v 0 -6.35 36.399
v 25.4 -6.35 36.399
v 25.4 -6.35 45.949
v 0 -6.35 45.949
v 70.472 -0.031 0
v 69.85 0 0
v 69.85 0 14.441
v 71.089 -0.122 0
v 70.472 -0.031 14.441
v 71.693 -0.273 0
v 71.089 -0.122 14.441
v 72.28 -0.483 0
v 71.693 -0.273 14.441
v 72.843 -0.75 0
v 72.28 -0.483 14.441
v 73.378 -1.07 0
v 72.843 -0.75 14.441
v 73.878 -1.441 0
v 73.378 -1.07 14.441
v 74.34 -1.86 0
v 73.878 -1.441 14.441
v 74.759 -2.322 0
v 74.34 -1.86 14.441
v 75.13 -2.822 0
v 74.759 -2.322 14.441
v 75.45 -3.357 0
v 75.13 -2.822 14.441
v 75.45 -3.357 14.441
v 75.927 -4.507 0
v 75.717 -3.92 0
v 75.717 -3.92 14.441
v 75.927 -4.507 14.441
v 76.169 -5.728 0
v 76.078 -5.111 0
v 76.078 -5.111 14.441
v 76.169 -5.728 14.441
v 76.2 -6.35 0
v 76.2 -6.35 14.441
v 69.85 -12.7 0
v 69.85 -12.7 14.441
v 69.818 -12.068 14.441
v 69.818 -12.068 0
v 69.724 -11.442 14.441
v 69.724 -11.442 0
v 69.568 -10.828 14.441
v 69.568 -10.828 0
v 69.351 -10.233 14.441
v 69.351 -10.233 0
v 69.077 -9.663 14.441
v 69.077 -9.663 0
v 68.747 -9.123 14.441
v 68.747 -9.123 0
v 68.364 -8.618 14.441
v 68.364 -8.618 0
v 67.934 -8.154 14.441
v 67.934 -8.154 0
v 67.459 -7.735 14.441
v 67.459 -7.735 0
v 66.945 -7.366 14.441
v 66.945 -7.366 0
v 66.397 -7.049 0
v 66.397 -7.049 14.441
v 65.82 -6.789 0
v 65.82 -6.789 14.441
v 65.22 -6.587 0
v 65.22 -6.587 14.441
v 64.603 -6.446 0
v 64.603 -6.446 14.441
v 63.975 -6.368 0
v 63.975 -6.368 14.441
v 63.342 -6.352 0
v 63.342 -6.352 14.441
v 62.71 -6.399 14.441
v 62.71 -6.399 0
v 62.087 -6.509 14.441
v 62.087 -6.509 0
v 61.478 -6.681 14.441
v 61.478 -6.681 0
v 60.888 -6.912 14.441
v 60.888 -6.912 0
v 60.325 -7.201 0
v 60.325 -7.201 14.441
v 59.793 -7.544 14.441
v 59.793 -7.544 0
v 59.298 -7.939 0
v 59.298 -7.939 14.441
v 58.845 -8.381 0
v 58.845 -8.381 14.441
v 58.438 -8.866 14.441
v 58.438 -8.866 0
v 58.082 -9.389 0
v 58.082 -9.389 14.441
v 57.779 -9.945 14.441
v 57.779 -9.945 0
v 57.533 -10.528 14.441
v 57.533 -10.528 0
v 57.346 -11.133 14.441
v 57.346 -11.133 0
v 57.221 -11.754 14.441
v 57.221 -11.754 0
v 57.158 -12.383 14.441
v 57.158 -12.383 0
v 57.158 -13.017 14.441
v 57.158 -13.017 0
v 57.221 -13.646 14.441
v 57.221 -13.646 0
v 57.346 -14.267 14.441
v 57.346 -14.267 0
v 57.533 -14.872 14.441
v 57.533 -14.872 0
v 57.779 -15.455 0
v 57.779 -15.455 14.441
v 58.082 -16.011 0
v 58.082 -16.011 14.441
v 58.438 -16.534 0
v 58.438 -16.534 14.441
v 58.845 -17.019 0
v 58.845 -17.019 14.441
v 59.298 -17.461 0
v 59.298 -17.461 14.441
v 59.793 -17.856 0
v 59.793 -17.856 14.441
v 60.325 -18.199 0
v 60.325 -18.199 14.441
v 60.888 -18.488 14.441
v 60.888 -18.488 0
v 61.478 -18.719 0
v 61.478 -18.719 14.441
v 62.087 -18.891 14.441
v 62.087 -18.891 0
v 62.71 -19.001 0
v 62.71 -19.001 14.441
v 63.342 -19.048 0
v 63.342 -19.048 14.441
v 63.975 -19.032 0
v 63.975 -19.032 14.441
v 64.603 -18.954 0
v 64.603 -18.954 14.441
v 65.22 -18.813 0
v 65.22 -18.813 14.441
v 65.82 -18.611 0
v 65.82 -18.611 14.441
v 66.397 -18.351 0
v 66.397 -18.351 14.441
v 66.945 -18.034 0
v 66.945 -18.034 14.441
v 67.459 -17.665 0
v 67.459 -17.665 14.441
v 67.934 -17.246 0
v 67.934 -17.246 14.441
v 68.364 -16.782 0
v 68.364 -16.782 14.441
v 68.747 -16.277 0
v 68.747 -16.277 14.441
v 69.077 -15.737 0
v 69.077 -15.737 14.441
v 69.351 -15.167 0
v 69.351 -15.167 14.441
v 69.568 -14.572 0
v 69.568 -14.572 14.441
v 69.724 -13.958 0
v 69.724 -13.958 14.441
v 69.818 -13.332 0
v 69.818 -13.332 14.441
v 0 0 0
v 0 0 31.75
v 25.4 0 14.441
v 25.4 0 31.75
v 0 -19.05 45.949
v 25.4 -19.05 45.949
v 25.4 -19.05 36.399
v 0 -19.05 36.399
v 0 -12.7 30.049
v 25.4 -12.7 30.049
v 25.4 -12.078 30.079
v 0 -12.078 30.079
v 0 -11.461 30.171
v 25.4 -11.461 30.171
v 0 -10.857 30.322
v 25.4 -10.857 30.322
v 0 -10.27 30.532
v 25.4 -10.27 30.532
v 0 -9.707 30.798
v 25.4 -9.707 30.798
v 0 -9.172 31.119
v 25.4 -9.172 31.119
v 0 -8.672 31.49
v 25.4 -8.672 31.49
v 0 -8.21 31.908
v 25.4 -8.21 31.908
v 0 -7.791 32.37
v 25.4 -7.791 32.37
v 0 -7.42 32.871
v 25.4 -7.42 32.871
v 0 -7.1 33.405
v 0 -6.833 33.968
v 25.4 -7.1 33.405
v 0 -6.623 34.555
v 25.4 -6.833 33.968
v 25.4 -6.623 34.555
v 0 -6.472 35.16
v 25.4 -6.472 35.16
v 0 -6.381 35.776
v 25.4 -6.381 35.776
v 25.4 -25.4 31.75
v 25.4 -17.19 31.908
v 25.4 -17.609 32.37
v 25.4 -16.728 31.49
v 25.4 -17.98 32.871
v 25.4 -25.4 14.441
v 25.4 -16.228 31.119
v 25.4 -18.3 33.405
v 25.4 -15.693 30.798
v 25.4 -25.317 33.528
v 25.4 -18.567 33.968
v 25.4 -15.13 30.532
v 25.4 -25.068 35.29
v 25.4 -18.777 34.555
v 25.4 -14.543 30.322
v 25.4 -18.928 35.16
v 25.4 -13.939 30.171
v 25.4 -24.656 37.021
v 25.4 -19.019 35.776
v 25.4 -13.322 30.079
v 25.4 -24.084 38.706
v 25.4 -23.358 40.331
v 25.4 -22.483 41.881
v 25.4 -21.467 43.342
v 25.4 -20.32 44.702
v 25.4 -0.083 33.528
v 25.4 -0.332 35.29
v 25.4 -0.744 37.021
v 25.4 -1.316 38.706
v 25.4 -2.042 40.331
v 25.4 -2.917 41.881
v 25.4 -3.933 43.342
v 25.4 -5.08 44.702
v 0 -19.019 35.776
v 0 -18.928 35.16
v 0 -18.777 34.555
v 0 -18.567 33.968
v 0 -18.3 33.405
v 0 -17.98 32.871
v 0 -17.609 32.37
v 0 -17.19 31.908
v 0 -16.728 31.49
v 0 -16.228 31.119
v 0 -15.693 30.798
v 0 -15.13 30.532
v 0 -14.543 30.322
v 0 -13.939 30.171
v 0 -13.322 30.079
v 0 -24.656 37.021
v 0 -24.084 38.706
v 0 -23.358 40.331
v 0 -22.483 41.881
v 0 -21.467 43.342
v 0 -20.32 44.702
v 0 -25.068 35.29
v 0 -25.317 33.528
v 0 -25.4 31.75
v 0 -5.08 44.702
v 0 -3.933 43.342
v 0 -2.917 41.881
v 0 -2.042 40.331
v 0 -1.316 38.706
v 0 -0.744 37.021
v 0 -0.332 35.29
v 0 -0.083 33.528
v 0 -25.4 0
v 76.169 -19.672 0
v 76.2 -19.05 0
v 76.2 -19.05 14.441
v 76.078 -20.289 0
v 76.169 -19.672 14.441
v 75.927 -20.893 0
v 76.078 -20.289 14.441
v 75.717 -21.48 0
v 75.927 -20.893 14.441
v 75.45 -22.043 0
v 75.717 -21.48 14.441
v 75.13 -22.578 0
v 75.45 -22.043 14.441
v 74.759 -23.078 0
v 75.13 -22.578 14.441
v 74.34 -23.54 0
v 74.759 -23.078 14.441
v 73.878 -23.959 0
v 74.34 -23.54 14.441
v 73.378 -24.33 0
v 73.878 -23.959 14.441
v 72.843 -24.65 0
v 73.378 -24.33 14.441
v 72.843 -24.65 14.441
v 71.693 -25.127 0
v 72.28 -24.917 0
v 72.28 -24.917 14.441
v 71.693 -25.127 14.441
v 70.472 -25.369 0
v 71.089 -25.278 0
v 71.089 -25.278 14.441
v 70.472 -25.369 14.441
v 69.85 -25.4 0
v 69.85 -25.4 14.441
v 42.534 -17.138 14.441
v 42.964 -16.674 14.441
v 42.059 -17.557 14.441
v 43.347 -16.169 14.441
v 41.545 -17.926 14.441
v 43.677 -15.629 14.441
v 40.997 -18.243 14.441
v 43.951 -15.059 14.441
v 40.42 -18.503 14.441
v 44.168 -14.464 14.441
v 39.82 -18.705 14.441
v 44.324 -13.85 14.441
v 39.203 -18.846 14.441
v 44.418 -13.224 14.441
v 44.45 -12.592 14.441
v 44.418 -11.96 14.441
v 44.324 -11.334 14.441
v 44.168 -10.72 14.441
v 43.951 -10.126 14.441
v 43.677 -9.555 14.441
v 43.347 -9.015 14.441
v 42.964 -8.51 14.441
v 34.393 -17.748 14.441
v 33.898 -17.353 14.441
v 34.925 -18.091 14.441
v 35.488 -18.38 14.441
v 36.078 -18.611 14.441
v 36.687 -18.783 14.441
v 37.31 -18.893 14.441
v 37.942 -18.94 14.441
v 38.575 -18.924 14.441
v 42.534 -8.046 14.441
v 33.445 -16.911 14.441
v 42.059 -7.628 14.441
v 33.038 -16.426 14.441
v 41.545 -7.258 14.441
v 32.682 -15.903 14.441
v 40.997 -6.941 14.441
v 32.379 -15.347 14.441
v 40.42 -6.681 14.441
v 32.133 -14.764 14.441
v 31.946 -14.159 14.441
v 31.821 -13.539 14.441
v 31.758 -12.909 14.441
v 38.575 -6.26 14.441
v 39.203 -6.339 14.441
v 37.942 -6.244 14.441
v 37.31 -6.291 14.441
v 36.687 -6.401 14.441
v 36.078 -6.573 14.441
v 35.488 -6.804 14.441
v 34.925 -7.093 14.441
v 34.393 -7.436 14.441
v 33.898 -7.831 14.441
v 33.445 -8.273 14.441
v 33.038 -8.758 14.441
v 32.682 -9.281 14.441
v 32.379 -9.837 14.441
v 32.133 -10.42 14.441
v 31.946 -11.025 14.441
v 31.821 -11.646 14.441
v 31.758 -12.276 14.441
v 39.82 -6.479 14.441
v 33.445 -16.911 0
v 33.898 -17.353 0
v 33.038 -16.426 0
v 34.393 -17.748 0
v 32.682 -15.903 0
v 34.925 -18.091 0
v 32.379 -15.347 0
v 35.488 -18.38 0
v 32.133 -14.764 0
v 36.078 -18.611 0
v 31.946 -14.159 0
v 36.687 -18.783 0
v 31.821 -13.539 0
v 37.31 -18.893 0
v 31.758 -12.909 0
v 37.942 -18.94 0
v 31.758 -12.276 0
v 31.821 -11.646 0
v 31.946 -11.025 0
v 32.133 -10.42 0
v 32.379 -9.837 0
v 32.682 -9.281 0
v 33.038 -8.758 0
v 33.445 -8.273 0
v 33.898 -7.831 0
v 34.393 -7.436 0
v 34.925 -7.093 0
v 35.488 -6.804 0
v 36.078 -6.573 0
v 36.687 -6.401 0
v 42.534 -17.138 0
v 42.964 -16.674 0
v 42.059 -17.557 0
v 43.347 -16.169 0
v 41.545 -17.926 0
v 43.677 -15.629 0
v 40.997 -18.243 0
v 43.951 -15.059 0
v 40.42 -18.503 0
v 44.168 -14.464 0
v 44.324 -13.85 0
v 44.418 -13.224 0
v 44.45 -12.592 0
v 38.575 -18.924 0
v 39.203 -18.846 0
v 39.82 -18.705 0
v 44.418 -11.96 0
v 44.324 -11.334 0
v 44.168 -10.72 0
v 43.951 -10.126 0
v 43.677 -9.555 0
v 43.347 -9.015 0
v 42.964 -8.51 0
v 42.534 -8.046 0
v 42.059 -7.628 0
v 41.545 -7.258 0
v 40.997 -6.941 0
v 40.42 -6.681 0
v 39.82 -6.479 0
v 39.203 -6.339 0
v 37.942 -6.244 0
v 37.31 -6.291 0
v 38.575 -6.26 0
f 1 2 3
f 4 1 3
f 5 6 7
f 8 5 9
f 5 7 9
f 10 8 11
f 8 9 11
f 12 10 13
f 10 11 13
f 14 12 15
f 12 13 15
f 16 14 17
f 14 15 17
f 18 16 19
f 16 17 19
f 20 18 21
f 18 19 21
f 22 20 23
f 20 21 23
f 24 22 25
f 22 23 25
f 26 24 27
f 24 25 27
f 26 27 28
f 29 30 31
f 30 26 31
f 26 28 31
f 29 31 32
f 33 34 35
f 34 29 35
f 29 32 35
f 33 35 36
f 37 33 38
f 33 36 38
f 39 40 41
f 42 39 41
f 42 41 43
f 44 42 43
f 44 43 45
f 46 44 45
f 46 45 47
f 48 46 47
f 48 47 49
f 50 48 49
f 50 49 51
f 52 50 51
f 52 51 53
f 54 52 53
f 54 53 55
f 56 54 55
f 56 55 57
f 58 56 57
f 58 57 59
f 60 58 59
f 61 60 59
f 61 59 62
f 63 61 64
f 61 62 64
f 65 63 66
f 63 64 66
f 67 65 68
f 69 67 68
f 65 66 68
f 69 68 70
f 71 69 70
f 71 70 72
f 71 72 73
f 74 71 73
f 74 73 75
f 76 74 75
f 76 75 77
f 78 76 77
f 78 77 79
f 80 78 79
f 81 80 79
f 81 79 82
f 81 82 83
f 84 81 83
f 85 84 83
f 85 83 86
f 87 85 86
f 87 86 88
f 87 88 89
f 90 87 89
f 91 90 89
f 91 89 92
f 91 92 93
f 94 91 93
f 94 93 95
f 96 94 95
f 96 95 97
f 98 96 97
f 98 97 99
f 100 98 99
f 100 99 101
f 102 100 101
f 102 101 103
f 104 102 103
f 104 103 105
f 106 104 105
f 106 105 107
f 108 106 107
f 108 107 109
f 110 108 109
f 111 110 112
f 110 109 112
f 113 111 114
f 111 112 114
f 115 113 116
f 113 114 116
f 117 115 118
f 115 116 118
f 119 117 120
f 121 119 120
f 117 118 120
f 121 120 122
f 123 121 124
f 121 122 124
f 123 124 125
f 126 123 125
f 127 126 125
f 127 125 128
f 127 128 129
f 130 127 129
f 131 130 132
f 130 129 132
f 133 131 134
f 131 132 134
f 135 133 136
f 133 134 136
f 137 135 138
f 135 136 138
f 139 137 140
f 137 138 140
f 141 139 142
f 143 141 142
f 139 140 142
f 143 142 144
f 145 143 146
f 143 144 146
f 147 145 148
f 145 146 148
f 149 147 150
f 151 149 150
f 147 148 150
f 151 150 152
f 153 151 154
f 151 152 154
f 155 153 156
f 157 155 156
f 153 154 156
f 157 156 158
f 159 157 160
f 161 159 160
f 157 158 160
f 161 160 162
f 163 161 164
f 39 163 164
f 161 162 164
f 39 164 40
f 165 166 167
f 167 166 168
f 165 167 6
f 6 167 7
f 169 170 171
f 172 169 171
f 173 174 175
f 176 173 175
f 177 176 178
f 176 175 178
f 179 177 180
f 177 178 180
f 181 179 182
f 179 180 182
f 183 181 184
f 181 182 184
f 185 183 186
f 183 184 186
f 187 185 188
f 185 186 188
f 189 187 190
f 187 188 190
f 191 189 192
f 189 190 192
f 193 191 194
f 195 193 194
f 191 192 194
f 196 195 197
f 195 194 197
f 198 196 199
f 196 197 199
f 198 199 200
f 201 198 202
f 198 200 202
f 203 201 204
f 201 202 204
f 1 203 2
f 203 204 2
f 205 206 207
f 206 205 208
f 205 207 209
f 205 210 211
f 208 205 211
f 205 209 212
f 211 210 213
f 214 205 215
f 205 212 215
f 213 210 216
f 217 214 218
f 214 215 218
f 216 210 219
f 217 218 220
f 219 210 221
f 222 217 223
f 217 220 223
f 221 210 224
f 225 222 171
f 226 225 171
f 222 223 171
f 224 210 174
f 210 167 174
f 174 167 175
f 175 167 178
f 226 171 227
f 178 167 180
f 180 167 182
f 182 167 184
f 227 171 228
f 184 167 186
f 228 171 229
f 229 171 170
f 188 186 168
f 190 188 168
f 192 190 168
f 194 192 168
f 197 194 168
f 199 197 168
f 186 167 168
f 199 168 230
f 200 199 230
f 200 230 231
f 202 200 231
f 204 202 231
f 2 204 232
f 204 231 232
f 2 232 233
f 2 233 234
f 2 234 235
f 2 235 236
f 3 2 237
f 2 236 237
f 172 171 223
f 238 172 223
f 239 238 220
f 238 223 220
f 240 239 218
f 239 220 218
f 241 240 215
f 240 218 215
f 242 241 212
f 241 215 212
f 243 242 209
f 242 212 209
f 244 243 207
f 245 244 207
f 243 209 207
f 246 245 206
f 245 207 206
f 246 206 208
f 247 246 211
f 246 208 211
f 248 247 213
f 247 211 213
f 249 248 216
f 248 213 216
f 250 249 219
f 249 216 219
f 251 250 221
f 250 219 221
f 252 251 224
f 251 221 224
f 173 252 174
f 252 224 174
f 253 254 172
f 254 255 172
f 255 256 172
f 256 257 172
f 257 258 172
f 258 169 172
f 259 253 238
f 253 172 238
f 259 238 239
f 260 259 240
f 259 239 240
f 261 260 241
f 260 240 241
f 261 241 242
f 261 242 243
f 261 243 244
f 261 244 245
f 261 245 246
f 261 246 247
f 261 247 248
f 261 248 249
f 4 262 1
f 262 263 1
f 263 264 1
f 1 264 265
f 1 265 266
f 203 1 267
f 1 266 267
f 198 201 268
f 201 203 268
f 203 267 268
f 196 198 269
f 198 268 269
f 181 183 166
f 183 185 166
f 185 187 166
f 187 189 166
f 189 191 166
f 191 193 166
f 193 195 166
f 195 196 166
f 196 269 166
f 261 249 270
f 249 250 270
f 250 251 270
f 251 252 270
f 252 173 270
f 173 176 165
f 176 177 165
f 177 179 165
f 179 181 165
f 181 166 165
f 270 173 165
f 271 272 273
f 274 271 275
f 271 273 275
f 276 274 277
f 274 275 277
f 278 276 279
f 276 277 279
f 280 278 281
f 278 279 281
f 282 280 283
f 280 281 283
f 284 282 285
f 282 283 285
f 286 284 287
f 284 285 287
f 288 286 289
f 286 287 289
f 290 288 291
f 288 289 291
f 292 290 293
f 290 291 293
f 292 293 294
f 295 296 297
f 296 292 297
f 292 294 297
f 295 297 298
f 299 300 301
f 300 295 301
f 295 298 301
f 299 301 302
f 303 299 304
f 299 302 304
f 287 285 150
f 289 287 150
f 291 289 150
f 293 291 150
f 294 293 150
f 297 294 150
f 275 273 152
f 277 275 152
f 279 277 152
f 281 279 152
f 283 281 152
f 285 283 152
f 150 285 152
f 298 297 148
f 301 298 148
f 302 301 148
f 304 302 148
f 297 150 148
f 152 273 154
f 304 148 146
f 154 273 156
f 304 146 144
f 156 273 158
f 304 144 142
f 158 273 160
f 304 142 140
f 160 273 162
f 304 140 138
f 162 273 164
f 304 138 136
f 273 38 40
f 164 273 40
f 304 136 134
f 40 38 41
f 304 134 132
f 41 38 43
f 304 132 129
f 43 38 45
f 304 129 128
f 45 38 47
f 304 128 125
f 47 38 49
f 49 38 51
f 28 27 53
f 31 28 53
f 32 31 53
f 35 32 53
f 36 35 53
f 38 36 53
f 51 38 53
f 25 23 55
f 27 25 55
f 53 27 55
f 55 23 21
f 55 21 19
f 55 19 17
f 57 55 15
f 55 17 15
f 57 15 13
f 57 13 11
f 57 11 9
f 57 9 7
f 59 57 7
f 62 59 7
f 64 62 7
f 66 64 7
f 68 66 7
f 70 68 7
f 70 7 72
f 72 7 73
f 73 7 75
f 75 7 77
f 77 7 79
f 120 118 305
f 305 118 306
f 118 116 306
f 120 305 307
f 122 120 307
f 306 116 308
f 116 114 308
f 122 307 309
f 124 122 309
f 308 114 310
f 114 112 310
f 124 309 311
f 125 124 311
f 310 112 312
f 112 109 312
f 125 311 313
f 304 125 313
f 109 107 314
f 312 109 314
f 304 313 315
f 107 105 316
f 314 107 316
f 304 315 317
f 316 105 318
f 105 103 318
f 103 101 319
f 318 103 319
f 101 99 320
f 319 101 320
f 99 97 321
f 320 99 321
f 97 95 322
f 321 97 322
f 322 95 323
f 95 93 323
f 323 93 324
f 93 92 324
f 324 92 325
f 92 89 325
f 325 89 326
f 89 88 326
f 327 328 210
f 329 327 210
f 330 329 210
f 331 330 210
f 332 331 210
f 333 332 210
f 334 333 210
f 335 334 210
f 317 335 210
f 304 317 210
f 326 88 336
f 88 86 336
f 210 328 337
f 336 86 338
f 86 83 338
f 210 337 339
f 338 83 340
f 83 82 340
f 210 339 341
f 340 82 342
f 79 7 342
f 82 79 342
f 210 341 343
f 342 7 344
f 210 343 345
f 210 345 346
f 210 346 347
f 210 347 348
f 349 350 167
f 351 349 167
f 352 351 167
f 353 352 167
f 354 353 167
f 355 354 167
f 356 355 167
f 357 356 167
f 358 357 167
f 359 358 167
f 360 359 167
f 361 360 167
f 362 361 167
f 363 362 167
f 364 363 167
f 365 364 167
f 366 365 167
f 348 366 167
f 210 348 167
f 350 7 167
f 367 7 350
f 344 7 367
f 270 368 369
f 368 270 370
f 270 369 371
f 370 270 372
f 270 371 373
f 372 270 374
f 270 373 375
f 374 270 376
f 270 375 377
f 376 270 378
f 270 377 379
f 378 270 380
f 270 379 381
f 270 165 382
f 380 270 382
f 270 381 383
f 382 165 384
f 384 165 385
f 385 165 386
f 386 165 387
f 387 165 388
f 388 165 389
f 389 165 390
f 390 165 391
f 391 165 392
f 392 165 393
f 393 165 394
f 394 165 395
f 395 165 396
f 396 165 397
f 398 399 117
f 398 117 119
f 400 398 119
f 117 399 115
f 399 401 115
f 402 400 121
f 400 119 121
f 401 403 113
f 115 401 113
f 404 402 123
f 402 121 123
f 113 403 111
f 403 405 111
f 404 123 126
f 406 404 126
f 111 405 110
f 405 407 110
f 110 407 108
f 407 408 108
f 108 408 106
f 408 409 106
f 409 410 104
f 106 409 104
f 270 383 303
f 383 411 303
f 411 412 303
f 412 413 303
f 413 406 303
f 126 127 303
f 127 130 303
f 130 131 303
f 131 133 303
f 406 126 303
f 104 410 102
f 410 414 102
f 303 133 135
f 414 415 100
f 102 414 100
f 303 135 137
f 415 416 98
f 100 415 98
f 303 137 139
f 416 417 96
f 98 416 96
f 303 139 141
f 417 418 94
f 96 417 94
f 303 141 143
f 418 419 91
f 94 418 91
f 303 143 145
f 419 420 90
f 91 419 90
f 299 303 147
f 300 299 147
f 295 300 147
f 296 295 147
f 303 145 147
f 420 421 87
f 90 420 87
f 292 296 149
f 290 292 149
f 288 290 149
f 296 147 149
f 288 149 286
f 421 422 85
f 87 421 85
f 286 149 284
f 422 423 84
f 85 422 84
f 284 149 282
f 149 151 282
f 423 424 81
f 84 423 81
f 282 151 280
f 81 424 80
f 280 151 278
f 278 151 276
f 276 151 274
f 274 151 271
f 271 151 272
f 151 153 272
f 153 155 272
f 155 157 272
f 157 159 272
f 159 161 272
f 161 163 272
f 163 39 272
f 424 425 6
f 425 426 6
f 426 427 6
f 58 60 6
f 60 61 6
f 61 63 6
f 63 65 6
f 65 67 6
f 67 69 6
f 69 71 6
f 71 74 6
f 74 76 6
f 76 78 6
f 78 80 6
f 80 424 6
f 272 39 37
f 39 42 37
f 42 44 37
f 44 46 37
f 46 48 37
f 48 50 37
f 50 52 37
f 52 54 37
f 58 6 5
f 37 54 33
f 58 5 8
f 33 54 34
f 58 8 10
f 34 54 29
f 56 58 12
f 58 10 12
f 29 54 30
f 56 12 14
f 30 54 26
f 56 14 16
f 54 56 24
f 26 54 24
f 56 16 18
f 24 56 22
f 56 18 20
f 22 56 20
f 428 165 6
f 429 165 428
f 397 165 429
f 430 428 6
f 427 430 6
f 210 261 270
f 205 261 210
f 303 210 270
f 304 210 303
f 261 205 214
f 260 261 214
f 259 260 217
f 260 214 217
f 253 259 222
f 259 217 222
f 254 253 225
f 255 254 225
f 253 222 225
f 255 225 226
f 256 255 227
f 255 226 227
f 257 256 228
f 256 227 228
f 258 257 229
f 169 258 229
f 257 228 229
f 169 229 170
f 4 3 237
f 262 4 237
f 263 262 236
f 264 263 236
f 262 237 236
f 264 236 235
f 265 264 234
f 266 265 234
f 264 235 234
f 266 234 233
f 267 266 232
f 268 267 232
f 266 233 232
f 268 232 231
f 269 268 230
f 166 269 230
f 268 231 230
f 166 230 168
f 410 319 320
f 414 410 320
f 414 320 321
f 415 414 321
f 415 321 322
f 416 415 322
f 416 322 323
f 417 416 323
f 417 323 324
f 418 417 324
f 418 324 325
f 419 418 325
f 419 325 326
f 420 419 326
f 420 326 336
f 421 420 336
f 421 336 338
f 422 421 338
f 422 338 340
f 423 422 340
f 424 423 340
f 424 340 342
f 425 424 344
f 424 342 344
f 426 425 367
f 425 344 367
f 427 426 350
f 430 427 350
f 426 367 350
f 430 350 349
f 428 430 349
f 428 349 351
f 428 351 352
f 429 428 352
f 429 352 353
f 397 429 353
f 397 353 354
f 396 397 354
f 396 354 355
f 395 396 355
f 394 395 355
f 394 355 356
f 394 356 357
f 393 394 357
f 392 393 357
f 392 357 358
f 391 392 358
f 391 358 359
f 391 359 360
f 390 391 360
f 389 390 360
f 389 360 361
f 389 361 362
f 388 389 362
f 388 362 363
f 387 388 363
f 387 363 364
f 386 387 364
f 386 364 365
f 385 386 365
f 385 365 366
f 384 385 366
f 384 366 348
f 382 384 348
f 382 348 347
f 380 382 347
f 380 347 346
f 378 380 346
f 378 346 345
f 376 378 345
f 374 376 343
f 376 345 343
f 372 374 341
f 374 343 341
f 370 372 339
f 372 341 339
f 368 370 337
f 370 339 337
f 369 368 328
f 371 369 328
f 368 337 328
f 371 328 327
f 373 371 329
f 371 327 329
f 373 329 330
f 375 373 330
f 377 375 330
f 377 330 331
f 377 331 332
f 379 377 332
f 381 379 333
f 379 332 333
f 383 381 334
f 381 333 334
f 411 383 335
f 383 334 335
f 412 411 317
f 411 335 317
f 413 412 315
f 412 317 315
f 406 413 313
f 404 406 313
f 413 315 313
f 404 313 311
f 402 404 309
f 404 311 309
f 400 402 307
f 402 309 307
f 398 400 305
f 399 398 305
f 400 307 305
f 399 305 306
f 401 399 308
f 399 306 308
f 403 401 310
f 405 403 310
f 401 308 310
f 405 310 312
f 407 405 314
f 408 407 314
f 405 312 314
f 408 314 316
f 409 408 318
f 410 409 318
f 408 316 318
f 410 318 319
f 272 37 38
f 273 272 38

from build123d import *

# Parameters (mm, degrees)
F1_DEPTH = 25.4
F3_DEPTH = 25.4
F5_DEPTH = 25.4
F6_R     = 6.35
F7_DEPTH = 25.4
F8_R     = 6.35
F9_DEPTH = 25.4


with BuildPart() as f1:
    # F0 (on Front) → F1 (new body)
    with BuildSketch(Plane.XZ):
        Polygon((0, 50.8), (0, 0), (76.2, 0), (76.2, 14.440612), (25.4, 14.440612), (25.4, 50.8), align=None)
    extrude(amount=F1_DEPTH)

    # F2 (on face) → F3 (cut)
    with BuildSketch(Plane.YZ.offset(25.4)):
        with BuildLine():
            Line((-25.4, 50.8), (-25.4, 31.75))
            ThreePointArc((-25.4, 31.75), (-21.90426, 42.748523), (-12.7, 49.710512))
            ThreePointArc((-12.7, 49.710512), (-15.828607, 50.525653), (-19.05, 50.8))
            Line((-19.05, 50.8), (-25.4, 50.8))
        make_face()
        with BuildLine():
            ThreePointArc((-6.35, 50.8), (-9.571393, 50.525653), (-12.7, 49.710512))
            ThreePointArc((-12.7, 49.710512), (-3.49574, 42.748523), (0, 31.75))
            Line((0, 31.75), (0, 50.8))
            Line((0, 50.8), (-6.35, 50.8))
        make_face()
        with BuildLine():
            ThreePointArc((-19.05, 50.8), (-15.828607, 50.525653), (-12.7, 49.710512))
            ThreePointArc((-12.7, 49.710512), (-9.571393, 50.525653), (-6.35, 50.8))
            Line((-6.35, 50.8), (-19.05, 50.8))
        make_face()
    extrude(amount=-F3_DEPTH, mode=Mode.SUBTRACT)

    # F4 (on face) → F5 (cut)
    with BuildSketch(Plane.YZ.offset(25.4)):
        with BuildLine():
            ThreePointArc((-12.7, 49.710512), (-16.058904, 48.140232), (-19.05, 45.949032))
            Line((-19.05, 45.949032), (-19.05, 36.398523))
            ThreePointArc((-19.05, 36.398523), (-17.190128, 31.908395), (-12.7, 30.048523))
            ThreePointArc((-12.7, 30.048523), (-8.209872, 31.908395), (-6.35, 36.398523))
            Line((-6.35, 36.398523), (-6.35, 45.949032))
            ThreePointArc((-6.35, 45.949032), (-9.341096, 48.140232), (-12.7, 49.710512))
        make_face()
    extrude(amount=-F5_DEPTH, mode=Mode.SUBTRACT)

    # F6 (on face) → F7 (cut)
    with BuildSketch(Plane.XY.offset(14.440612)):
        with Locations((38.1, -12.59214)):
            Circle(F6_R)
        with Locations((63.5, -12.7)):
            Circle(F6_R)
    extrude(amount=-F7_DEPTH, mode=Mode.SUBTRACT)

    # F8 (on face) → F9 (cut)
    with BuildSketch(Plane.XY.offset(14.440612)):
        with Locations((38.1, -12.59214)):
            Circle(F8_R)
        with Locations((63.5, -12.7)):
            Circle(F8_R)
        with BuildLine():
            Line((76.2, 0), (69.85, 0))
            ThreePointArc((69.85, 0), (74.340128, -1.859872), (76.2, -6.35))
            Line((76.2, -6.35), (76.2, 0))
        make_face()
        with BuildLine():
            ThreePointArc((76.2, -19.05), (74.340128, -23.540128), (69.85, -25.4))
            Line((69.85, -25.4), (76.2, -25.4))
            Line((76.2, -25.4), (76.2, -19.05))
        make_face()
    extrude(amount=-F9_DEPTH, mode=Mode.SUBTRACT)


solid = f1.part
